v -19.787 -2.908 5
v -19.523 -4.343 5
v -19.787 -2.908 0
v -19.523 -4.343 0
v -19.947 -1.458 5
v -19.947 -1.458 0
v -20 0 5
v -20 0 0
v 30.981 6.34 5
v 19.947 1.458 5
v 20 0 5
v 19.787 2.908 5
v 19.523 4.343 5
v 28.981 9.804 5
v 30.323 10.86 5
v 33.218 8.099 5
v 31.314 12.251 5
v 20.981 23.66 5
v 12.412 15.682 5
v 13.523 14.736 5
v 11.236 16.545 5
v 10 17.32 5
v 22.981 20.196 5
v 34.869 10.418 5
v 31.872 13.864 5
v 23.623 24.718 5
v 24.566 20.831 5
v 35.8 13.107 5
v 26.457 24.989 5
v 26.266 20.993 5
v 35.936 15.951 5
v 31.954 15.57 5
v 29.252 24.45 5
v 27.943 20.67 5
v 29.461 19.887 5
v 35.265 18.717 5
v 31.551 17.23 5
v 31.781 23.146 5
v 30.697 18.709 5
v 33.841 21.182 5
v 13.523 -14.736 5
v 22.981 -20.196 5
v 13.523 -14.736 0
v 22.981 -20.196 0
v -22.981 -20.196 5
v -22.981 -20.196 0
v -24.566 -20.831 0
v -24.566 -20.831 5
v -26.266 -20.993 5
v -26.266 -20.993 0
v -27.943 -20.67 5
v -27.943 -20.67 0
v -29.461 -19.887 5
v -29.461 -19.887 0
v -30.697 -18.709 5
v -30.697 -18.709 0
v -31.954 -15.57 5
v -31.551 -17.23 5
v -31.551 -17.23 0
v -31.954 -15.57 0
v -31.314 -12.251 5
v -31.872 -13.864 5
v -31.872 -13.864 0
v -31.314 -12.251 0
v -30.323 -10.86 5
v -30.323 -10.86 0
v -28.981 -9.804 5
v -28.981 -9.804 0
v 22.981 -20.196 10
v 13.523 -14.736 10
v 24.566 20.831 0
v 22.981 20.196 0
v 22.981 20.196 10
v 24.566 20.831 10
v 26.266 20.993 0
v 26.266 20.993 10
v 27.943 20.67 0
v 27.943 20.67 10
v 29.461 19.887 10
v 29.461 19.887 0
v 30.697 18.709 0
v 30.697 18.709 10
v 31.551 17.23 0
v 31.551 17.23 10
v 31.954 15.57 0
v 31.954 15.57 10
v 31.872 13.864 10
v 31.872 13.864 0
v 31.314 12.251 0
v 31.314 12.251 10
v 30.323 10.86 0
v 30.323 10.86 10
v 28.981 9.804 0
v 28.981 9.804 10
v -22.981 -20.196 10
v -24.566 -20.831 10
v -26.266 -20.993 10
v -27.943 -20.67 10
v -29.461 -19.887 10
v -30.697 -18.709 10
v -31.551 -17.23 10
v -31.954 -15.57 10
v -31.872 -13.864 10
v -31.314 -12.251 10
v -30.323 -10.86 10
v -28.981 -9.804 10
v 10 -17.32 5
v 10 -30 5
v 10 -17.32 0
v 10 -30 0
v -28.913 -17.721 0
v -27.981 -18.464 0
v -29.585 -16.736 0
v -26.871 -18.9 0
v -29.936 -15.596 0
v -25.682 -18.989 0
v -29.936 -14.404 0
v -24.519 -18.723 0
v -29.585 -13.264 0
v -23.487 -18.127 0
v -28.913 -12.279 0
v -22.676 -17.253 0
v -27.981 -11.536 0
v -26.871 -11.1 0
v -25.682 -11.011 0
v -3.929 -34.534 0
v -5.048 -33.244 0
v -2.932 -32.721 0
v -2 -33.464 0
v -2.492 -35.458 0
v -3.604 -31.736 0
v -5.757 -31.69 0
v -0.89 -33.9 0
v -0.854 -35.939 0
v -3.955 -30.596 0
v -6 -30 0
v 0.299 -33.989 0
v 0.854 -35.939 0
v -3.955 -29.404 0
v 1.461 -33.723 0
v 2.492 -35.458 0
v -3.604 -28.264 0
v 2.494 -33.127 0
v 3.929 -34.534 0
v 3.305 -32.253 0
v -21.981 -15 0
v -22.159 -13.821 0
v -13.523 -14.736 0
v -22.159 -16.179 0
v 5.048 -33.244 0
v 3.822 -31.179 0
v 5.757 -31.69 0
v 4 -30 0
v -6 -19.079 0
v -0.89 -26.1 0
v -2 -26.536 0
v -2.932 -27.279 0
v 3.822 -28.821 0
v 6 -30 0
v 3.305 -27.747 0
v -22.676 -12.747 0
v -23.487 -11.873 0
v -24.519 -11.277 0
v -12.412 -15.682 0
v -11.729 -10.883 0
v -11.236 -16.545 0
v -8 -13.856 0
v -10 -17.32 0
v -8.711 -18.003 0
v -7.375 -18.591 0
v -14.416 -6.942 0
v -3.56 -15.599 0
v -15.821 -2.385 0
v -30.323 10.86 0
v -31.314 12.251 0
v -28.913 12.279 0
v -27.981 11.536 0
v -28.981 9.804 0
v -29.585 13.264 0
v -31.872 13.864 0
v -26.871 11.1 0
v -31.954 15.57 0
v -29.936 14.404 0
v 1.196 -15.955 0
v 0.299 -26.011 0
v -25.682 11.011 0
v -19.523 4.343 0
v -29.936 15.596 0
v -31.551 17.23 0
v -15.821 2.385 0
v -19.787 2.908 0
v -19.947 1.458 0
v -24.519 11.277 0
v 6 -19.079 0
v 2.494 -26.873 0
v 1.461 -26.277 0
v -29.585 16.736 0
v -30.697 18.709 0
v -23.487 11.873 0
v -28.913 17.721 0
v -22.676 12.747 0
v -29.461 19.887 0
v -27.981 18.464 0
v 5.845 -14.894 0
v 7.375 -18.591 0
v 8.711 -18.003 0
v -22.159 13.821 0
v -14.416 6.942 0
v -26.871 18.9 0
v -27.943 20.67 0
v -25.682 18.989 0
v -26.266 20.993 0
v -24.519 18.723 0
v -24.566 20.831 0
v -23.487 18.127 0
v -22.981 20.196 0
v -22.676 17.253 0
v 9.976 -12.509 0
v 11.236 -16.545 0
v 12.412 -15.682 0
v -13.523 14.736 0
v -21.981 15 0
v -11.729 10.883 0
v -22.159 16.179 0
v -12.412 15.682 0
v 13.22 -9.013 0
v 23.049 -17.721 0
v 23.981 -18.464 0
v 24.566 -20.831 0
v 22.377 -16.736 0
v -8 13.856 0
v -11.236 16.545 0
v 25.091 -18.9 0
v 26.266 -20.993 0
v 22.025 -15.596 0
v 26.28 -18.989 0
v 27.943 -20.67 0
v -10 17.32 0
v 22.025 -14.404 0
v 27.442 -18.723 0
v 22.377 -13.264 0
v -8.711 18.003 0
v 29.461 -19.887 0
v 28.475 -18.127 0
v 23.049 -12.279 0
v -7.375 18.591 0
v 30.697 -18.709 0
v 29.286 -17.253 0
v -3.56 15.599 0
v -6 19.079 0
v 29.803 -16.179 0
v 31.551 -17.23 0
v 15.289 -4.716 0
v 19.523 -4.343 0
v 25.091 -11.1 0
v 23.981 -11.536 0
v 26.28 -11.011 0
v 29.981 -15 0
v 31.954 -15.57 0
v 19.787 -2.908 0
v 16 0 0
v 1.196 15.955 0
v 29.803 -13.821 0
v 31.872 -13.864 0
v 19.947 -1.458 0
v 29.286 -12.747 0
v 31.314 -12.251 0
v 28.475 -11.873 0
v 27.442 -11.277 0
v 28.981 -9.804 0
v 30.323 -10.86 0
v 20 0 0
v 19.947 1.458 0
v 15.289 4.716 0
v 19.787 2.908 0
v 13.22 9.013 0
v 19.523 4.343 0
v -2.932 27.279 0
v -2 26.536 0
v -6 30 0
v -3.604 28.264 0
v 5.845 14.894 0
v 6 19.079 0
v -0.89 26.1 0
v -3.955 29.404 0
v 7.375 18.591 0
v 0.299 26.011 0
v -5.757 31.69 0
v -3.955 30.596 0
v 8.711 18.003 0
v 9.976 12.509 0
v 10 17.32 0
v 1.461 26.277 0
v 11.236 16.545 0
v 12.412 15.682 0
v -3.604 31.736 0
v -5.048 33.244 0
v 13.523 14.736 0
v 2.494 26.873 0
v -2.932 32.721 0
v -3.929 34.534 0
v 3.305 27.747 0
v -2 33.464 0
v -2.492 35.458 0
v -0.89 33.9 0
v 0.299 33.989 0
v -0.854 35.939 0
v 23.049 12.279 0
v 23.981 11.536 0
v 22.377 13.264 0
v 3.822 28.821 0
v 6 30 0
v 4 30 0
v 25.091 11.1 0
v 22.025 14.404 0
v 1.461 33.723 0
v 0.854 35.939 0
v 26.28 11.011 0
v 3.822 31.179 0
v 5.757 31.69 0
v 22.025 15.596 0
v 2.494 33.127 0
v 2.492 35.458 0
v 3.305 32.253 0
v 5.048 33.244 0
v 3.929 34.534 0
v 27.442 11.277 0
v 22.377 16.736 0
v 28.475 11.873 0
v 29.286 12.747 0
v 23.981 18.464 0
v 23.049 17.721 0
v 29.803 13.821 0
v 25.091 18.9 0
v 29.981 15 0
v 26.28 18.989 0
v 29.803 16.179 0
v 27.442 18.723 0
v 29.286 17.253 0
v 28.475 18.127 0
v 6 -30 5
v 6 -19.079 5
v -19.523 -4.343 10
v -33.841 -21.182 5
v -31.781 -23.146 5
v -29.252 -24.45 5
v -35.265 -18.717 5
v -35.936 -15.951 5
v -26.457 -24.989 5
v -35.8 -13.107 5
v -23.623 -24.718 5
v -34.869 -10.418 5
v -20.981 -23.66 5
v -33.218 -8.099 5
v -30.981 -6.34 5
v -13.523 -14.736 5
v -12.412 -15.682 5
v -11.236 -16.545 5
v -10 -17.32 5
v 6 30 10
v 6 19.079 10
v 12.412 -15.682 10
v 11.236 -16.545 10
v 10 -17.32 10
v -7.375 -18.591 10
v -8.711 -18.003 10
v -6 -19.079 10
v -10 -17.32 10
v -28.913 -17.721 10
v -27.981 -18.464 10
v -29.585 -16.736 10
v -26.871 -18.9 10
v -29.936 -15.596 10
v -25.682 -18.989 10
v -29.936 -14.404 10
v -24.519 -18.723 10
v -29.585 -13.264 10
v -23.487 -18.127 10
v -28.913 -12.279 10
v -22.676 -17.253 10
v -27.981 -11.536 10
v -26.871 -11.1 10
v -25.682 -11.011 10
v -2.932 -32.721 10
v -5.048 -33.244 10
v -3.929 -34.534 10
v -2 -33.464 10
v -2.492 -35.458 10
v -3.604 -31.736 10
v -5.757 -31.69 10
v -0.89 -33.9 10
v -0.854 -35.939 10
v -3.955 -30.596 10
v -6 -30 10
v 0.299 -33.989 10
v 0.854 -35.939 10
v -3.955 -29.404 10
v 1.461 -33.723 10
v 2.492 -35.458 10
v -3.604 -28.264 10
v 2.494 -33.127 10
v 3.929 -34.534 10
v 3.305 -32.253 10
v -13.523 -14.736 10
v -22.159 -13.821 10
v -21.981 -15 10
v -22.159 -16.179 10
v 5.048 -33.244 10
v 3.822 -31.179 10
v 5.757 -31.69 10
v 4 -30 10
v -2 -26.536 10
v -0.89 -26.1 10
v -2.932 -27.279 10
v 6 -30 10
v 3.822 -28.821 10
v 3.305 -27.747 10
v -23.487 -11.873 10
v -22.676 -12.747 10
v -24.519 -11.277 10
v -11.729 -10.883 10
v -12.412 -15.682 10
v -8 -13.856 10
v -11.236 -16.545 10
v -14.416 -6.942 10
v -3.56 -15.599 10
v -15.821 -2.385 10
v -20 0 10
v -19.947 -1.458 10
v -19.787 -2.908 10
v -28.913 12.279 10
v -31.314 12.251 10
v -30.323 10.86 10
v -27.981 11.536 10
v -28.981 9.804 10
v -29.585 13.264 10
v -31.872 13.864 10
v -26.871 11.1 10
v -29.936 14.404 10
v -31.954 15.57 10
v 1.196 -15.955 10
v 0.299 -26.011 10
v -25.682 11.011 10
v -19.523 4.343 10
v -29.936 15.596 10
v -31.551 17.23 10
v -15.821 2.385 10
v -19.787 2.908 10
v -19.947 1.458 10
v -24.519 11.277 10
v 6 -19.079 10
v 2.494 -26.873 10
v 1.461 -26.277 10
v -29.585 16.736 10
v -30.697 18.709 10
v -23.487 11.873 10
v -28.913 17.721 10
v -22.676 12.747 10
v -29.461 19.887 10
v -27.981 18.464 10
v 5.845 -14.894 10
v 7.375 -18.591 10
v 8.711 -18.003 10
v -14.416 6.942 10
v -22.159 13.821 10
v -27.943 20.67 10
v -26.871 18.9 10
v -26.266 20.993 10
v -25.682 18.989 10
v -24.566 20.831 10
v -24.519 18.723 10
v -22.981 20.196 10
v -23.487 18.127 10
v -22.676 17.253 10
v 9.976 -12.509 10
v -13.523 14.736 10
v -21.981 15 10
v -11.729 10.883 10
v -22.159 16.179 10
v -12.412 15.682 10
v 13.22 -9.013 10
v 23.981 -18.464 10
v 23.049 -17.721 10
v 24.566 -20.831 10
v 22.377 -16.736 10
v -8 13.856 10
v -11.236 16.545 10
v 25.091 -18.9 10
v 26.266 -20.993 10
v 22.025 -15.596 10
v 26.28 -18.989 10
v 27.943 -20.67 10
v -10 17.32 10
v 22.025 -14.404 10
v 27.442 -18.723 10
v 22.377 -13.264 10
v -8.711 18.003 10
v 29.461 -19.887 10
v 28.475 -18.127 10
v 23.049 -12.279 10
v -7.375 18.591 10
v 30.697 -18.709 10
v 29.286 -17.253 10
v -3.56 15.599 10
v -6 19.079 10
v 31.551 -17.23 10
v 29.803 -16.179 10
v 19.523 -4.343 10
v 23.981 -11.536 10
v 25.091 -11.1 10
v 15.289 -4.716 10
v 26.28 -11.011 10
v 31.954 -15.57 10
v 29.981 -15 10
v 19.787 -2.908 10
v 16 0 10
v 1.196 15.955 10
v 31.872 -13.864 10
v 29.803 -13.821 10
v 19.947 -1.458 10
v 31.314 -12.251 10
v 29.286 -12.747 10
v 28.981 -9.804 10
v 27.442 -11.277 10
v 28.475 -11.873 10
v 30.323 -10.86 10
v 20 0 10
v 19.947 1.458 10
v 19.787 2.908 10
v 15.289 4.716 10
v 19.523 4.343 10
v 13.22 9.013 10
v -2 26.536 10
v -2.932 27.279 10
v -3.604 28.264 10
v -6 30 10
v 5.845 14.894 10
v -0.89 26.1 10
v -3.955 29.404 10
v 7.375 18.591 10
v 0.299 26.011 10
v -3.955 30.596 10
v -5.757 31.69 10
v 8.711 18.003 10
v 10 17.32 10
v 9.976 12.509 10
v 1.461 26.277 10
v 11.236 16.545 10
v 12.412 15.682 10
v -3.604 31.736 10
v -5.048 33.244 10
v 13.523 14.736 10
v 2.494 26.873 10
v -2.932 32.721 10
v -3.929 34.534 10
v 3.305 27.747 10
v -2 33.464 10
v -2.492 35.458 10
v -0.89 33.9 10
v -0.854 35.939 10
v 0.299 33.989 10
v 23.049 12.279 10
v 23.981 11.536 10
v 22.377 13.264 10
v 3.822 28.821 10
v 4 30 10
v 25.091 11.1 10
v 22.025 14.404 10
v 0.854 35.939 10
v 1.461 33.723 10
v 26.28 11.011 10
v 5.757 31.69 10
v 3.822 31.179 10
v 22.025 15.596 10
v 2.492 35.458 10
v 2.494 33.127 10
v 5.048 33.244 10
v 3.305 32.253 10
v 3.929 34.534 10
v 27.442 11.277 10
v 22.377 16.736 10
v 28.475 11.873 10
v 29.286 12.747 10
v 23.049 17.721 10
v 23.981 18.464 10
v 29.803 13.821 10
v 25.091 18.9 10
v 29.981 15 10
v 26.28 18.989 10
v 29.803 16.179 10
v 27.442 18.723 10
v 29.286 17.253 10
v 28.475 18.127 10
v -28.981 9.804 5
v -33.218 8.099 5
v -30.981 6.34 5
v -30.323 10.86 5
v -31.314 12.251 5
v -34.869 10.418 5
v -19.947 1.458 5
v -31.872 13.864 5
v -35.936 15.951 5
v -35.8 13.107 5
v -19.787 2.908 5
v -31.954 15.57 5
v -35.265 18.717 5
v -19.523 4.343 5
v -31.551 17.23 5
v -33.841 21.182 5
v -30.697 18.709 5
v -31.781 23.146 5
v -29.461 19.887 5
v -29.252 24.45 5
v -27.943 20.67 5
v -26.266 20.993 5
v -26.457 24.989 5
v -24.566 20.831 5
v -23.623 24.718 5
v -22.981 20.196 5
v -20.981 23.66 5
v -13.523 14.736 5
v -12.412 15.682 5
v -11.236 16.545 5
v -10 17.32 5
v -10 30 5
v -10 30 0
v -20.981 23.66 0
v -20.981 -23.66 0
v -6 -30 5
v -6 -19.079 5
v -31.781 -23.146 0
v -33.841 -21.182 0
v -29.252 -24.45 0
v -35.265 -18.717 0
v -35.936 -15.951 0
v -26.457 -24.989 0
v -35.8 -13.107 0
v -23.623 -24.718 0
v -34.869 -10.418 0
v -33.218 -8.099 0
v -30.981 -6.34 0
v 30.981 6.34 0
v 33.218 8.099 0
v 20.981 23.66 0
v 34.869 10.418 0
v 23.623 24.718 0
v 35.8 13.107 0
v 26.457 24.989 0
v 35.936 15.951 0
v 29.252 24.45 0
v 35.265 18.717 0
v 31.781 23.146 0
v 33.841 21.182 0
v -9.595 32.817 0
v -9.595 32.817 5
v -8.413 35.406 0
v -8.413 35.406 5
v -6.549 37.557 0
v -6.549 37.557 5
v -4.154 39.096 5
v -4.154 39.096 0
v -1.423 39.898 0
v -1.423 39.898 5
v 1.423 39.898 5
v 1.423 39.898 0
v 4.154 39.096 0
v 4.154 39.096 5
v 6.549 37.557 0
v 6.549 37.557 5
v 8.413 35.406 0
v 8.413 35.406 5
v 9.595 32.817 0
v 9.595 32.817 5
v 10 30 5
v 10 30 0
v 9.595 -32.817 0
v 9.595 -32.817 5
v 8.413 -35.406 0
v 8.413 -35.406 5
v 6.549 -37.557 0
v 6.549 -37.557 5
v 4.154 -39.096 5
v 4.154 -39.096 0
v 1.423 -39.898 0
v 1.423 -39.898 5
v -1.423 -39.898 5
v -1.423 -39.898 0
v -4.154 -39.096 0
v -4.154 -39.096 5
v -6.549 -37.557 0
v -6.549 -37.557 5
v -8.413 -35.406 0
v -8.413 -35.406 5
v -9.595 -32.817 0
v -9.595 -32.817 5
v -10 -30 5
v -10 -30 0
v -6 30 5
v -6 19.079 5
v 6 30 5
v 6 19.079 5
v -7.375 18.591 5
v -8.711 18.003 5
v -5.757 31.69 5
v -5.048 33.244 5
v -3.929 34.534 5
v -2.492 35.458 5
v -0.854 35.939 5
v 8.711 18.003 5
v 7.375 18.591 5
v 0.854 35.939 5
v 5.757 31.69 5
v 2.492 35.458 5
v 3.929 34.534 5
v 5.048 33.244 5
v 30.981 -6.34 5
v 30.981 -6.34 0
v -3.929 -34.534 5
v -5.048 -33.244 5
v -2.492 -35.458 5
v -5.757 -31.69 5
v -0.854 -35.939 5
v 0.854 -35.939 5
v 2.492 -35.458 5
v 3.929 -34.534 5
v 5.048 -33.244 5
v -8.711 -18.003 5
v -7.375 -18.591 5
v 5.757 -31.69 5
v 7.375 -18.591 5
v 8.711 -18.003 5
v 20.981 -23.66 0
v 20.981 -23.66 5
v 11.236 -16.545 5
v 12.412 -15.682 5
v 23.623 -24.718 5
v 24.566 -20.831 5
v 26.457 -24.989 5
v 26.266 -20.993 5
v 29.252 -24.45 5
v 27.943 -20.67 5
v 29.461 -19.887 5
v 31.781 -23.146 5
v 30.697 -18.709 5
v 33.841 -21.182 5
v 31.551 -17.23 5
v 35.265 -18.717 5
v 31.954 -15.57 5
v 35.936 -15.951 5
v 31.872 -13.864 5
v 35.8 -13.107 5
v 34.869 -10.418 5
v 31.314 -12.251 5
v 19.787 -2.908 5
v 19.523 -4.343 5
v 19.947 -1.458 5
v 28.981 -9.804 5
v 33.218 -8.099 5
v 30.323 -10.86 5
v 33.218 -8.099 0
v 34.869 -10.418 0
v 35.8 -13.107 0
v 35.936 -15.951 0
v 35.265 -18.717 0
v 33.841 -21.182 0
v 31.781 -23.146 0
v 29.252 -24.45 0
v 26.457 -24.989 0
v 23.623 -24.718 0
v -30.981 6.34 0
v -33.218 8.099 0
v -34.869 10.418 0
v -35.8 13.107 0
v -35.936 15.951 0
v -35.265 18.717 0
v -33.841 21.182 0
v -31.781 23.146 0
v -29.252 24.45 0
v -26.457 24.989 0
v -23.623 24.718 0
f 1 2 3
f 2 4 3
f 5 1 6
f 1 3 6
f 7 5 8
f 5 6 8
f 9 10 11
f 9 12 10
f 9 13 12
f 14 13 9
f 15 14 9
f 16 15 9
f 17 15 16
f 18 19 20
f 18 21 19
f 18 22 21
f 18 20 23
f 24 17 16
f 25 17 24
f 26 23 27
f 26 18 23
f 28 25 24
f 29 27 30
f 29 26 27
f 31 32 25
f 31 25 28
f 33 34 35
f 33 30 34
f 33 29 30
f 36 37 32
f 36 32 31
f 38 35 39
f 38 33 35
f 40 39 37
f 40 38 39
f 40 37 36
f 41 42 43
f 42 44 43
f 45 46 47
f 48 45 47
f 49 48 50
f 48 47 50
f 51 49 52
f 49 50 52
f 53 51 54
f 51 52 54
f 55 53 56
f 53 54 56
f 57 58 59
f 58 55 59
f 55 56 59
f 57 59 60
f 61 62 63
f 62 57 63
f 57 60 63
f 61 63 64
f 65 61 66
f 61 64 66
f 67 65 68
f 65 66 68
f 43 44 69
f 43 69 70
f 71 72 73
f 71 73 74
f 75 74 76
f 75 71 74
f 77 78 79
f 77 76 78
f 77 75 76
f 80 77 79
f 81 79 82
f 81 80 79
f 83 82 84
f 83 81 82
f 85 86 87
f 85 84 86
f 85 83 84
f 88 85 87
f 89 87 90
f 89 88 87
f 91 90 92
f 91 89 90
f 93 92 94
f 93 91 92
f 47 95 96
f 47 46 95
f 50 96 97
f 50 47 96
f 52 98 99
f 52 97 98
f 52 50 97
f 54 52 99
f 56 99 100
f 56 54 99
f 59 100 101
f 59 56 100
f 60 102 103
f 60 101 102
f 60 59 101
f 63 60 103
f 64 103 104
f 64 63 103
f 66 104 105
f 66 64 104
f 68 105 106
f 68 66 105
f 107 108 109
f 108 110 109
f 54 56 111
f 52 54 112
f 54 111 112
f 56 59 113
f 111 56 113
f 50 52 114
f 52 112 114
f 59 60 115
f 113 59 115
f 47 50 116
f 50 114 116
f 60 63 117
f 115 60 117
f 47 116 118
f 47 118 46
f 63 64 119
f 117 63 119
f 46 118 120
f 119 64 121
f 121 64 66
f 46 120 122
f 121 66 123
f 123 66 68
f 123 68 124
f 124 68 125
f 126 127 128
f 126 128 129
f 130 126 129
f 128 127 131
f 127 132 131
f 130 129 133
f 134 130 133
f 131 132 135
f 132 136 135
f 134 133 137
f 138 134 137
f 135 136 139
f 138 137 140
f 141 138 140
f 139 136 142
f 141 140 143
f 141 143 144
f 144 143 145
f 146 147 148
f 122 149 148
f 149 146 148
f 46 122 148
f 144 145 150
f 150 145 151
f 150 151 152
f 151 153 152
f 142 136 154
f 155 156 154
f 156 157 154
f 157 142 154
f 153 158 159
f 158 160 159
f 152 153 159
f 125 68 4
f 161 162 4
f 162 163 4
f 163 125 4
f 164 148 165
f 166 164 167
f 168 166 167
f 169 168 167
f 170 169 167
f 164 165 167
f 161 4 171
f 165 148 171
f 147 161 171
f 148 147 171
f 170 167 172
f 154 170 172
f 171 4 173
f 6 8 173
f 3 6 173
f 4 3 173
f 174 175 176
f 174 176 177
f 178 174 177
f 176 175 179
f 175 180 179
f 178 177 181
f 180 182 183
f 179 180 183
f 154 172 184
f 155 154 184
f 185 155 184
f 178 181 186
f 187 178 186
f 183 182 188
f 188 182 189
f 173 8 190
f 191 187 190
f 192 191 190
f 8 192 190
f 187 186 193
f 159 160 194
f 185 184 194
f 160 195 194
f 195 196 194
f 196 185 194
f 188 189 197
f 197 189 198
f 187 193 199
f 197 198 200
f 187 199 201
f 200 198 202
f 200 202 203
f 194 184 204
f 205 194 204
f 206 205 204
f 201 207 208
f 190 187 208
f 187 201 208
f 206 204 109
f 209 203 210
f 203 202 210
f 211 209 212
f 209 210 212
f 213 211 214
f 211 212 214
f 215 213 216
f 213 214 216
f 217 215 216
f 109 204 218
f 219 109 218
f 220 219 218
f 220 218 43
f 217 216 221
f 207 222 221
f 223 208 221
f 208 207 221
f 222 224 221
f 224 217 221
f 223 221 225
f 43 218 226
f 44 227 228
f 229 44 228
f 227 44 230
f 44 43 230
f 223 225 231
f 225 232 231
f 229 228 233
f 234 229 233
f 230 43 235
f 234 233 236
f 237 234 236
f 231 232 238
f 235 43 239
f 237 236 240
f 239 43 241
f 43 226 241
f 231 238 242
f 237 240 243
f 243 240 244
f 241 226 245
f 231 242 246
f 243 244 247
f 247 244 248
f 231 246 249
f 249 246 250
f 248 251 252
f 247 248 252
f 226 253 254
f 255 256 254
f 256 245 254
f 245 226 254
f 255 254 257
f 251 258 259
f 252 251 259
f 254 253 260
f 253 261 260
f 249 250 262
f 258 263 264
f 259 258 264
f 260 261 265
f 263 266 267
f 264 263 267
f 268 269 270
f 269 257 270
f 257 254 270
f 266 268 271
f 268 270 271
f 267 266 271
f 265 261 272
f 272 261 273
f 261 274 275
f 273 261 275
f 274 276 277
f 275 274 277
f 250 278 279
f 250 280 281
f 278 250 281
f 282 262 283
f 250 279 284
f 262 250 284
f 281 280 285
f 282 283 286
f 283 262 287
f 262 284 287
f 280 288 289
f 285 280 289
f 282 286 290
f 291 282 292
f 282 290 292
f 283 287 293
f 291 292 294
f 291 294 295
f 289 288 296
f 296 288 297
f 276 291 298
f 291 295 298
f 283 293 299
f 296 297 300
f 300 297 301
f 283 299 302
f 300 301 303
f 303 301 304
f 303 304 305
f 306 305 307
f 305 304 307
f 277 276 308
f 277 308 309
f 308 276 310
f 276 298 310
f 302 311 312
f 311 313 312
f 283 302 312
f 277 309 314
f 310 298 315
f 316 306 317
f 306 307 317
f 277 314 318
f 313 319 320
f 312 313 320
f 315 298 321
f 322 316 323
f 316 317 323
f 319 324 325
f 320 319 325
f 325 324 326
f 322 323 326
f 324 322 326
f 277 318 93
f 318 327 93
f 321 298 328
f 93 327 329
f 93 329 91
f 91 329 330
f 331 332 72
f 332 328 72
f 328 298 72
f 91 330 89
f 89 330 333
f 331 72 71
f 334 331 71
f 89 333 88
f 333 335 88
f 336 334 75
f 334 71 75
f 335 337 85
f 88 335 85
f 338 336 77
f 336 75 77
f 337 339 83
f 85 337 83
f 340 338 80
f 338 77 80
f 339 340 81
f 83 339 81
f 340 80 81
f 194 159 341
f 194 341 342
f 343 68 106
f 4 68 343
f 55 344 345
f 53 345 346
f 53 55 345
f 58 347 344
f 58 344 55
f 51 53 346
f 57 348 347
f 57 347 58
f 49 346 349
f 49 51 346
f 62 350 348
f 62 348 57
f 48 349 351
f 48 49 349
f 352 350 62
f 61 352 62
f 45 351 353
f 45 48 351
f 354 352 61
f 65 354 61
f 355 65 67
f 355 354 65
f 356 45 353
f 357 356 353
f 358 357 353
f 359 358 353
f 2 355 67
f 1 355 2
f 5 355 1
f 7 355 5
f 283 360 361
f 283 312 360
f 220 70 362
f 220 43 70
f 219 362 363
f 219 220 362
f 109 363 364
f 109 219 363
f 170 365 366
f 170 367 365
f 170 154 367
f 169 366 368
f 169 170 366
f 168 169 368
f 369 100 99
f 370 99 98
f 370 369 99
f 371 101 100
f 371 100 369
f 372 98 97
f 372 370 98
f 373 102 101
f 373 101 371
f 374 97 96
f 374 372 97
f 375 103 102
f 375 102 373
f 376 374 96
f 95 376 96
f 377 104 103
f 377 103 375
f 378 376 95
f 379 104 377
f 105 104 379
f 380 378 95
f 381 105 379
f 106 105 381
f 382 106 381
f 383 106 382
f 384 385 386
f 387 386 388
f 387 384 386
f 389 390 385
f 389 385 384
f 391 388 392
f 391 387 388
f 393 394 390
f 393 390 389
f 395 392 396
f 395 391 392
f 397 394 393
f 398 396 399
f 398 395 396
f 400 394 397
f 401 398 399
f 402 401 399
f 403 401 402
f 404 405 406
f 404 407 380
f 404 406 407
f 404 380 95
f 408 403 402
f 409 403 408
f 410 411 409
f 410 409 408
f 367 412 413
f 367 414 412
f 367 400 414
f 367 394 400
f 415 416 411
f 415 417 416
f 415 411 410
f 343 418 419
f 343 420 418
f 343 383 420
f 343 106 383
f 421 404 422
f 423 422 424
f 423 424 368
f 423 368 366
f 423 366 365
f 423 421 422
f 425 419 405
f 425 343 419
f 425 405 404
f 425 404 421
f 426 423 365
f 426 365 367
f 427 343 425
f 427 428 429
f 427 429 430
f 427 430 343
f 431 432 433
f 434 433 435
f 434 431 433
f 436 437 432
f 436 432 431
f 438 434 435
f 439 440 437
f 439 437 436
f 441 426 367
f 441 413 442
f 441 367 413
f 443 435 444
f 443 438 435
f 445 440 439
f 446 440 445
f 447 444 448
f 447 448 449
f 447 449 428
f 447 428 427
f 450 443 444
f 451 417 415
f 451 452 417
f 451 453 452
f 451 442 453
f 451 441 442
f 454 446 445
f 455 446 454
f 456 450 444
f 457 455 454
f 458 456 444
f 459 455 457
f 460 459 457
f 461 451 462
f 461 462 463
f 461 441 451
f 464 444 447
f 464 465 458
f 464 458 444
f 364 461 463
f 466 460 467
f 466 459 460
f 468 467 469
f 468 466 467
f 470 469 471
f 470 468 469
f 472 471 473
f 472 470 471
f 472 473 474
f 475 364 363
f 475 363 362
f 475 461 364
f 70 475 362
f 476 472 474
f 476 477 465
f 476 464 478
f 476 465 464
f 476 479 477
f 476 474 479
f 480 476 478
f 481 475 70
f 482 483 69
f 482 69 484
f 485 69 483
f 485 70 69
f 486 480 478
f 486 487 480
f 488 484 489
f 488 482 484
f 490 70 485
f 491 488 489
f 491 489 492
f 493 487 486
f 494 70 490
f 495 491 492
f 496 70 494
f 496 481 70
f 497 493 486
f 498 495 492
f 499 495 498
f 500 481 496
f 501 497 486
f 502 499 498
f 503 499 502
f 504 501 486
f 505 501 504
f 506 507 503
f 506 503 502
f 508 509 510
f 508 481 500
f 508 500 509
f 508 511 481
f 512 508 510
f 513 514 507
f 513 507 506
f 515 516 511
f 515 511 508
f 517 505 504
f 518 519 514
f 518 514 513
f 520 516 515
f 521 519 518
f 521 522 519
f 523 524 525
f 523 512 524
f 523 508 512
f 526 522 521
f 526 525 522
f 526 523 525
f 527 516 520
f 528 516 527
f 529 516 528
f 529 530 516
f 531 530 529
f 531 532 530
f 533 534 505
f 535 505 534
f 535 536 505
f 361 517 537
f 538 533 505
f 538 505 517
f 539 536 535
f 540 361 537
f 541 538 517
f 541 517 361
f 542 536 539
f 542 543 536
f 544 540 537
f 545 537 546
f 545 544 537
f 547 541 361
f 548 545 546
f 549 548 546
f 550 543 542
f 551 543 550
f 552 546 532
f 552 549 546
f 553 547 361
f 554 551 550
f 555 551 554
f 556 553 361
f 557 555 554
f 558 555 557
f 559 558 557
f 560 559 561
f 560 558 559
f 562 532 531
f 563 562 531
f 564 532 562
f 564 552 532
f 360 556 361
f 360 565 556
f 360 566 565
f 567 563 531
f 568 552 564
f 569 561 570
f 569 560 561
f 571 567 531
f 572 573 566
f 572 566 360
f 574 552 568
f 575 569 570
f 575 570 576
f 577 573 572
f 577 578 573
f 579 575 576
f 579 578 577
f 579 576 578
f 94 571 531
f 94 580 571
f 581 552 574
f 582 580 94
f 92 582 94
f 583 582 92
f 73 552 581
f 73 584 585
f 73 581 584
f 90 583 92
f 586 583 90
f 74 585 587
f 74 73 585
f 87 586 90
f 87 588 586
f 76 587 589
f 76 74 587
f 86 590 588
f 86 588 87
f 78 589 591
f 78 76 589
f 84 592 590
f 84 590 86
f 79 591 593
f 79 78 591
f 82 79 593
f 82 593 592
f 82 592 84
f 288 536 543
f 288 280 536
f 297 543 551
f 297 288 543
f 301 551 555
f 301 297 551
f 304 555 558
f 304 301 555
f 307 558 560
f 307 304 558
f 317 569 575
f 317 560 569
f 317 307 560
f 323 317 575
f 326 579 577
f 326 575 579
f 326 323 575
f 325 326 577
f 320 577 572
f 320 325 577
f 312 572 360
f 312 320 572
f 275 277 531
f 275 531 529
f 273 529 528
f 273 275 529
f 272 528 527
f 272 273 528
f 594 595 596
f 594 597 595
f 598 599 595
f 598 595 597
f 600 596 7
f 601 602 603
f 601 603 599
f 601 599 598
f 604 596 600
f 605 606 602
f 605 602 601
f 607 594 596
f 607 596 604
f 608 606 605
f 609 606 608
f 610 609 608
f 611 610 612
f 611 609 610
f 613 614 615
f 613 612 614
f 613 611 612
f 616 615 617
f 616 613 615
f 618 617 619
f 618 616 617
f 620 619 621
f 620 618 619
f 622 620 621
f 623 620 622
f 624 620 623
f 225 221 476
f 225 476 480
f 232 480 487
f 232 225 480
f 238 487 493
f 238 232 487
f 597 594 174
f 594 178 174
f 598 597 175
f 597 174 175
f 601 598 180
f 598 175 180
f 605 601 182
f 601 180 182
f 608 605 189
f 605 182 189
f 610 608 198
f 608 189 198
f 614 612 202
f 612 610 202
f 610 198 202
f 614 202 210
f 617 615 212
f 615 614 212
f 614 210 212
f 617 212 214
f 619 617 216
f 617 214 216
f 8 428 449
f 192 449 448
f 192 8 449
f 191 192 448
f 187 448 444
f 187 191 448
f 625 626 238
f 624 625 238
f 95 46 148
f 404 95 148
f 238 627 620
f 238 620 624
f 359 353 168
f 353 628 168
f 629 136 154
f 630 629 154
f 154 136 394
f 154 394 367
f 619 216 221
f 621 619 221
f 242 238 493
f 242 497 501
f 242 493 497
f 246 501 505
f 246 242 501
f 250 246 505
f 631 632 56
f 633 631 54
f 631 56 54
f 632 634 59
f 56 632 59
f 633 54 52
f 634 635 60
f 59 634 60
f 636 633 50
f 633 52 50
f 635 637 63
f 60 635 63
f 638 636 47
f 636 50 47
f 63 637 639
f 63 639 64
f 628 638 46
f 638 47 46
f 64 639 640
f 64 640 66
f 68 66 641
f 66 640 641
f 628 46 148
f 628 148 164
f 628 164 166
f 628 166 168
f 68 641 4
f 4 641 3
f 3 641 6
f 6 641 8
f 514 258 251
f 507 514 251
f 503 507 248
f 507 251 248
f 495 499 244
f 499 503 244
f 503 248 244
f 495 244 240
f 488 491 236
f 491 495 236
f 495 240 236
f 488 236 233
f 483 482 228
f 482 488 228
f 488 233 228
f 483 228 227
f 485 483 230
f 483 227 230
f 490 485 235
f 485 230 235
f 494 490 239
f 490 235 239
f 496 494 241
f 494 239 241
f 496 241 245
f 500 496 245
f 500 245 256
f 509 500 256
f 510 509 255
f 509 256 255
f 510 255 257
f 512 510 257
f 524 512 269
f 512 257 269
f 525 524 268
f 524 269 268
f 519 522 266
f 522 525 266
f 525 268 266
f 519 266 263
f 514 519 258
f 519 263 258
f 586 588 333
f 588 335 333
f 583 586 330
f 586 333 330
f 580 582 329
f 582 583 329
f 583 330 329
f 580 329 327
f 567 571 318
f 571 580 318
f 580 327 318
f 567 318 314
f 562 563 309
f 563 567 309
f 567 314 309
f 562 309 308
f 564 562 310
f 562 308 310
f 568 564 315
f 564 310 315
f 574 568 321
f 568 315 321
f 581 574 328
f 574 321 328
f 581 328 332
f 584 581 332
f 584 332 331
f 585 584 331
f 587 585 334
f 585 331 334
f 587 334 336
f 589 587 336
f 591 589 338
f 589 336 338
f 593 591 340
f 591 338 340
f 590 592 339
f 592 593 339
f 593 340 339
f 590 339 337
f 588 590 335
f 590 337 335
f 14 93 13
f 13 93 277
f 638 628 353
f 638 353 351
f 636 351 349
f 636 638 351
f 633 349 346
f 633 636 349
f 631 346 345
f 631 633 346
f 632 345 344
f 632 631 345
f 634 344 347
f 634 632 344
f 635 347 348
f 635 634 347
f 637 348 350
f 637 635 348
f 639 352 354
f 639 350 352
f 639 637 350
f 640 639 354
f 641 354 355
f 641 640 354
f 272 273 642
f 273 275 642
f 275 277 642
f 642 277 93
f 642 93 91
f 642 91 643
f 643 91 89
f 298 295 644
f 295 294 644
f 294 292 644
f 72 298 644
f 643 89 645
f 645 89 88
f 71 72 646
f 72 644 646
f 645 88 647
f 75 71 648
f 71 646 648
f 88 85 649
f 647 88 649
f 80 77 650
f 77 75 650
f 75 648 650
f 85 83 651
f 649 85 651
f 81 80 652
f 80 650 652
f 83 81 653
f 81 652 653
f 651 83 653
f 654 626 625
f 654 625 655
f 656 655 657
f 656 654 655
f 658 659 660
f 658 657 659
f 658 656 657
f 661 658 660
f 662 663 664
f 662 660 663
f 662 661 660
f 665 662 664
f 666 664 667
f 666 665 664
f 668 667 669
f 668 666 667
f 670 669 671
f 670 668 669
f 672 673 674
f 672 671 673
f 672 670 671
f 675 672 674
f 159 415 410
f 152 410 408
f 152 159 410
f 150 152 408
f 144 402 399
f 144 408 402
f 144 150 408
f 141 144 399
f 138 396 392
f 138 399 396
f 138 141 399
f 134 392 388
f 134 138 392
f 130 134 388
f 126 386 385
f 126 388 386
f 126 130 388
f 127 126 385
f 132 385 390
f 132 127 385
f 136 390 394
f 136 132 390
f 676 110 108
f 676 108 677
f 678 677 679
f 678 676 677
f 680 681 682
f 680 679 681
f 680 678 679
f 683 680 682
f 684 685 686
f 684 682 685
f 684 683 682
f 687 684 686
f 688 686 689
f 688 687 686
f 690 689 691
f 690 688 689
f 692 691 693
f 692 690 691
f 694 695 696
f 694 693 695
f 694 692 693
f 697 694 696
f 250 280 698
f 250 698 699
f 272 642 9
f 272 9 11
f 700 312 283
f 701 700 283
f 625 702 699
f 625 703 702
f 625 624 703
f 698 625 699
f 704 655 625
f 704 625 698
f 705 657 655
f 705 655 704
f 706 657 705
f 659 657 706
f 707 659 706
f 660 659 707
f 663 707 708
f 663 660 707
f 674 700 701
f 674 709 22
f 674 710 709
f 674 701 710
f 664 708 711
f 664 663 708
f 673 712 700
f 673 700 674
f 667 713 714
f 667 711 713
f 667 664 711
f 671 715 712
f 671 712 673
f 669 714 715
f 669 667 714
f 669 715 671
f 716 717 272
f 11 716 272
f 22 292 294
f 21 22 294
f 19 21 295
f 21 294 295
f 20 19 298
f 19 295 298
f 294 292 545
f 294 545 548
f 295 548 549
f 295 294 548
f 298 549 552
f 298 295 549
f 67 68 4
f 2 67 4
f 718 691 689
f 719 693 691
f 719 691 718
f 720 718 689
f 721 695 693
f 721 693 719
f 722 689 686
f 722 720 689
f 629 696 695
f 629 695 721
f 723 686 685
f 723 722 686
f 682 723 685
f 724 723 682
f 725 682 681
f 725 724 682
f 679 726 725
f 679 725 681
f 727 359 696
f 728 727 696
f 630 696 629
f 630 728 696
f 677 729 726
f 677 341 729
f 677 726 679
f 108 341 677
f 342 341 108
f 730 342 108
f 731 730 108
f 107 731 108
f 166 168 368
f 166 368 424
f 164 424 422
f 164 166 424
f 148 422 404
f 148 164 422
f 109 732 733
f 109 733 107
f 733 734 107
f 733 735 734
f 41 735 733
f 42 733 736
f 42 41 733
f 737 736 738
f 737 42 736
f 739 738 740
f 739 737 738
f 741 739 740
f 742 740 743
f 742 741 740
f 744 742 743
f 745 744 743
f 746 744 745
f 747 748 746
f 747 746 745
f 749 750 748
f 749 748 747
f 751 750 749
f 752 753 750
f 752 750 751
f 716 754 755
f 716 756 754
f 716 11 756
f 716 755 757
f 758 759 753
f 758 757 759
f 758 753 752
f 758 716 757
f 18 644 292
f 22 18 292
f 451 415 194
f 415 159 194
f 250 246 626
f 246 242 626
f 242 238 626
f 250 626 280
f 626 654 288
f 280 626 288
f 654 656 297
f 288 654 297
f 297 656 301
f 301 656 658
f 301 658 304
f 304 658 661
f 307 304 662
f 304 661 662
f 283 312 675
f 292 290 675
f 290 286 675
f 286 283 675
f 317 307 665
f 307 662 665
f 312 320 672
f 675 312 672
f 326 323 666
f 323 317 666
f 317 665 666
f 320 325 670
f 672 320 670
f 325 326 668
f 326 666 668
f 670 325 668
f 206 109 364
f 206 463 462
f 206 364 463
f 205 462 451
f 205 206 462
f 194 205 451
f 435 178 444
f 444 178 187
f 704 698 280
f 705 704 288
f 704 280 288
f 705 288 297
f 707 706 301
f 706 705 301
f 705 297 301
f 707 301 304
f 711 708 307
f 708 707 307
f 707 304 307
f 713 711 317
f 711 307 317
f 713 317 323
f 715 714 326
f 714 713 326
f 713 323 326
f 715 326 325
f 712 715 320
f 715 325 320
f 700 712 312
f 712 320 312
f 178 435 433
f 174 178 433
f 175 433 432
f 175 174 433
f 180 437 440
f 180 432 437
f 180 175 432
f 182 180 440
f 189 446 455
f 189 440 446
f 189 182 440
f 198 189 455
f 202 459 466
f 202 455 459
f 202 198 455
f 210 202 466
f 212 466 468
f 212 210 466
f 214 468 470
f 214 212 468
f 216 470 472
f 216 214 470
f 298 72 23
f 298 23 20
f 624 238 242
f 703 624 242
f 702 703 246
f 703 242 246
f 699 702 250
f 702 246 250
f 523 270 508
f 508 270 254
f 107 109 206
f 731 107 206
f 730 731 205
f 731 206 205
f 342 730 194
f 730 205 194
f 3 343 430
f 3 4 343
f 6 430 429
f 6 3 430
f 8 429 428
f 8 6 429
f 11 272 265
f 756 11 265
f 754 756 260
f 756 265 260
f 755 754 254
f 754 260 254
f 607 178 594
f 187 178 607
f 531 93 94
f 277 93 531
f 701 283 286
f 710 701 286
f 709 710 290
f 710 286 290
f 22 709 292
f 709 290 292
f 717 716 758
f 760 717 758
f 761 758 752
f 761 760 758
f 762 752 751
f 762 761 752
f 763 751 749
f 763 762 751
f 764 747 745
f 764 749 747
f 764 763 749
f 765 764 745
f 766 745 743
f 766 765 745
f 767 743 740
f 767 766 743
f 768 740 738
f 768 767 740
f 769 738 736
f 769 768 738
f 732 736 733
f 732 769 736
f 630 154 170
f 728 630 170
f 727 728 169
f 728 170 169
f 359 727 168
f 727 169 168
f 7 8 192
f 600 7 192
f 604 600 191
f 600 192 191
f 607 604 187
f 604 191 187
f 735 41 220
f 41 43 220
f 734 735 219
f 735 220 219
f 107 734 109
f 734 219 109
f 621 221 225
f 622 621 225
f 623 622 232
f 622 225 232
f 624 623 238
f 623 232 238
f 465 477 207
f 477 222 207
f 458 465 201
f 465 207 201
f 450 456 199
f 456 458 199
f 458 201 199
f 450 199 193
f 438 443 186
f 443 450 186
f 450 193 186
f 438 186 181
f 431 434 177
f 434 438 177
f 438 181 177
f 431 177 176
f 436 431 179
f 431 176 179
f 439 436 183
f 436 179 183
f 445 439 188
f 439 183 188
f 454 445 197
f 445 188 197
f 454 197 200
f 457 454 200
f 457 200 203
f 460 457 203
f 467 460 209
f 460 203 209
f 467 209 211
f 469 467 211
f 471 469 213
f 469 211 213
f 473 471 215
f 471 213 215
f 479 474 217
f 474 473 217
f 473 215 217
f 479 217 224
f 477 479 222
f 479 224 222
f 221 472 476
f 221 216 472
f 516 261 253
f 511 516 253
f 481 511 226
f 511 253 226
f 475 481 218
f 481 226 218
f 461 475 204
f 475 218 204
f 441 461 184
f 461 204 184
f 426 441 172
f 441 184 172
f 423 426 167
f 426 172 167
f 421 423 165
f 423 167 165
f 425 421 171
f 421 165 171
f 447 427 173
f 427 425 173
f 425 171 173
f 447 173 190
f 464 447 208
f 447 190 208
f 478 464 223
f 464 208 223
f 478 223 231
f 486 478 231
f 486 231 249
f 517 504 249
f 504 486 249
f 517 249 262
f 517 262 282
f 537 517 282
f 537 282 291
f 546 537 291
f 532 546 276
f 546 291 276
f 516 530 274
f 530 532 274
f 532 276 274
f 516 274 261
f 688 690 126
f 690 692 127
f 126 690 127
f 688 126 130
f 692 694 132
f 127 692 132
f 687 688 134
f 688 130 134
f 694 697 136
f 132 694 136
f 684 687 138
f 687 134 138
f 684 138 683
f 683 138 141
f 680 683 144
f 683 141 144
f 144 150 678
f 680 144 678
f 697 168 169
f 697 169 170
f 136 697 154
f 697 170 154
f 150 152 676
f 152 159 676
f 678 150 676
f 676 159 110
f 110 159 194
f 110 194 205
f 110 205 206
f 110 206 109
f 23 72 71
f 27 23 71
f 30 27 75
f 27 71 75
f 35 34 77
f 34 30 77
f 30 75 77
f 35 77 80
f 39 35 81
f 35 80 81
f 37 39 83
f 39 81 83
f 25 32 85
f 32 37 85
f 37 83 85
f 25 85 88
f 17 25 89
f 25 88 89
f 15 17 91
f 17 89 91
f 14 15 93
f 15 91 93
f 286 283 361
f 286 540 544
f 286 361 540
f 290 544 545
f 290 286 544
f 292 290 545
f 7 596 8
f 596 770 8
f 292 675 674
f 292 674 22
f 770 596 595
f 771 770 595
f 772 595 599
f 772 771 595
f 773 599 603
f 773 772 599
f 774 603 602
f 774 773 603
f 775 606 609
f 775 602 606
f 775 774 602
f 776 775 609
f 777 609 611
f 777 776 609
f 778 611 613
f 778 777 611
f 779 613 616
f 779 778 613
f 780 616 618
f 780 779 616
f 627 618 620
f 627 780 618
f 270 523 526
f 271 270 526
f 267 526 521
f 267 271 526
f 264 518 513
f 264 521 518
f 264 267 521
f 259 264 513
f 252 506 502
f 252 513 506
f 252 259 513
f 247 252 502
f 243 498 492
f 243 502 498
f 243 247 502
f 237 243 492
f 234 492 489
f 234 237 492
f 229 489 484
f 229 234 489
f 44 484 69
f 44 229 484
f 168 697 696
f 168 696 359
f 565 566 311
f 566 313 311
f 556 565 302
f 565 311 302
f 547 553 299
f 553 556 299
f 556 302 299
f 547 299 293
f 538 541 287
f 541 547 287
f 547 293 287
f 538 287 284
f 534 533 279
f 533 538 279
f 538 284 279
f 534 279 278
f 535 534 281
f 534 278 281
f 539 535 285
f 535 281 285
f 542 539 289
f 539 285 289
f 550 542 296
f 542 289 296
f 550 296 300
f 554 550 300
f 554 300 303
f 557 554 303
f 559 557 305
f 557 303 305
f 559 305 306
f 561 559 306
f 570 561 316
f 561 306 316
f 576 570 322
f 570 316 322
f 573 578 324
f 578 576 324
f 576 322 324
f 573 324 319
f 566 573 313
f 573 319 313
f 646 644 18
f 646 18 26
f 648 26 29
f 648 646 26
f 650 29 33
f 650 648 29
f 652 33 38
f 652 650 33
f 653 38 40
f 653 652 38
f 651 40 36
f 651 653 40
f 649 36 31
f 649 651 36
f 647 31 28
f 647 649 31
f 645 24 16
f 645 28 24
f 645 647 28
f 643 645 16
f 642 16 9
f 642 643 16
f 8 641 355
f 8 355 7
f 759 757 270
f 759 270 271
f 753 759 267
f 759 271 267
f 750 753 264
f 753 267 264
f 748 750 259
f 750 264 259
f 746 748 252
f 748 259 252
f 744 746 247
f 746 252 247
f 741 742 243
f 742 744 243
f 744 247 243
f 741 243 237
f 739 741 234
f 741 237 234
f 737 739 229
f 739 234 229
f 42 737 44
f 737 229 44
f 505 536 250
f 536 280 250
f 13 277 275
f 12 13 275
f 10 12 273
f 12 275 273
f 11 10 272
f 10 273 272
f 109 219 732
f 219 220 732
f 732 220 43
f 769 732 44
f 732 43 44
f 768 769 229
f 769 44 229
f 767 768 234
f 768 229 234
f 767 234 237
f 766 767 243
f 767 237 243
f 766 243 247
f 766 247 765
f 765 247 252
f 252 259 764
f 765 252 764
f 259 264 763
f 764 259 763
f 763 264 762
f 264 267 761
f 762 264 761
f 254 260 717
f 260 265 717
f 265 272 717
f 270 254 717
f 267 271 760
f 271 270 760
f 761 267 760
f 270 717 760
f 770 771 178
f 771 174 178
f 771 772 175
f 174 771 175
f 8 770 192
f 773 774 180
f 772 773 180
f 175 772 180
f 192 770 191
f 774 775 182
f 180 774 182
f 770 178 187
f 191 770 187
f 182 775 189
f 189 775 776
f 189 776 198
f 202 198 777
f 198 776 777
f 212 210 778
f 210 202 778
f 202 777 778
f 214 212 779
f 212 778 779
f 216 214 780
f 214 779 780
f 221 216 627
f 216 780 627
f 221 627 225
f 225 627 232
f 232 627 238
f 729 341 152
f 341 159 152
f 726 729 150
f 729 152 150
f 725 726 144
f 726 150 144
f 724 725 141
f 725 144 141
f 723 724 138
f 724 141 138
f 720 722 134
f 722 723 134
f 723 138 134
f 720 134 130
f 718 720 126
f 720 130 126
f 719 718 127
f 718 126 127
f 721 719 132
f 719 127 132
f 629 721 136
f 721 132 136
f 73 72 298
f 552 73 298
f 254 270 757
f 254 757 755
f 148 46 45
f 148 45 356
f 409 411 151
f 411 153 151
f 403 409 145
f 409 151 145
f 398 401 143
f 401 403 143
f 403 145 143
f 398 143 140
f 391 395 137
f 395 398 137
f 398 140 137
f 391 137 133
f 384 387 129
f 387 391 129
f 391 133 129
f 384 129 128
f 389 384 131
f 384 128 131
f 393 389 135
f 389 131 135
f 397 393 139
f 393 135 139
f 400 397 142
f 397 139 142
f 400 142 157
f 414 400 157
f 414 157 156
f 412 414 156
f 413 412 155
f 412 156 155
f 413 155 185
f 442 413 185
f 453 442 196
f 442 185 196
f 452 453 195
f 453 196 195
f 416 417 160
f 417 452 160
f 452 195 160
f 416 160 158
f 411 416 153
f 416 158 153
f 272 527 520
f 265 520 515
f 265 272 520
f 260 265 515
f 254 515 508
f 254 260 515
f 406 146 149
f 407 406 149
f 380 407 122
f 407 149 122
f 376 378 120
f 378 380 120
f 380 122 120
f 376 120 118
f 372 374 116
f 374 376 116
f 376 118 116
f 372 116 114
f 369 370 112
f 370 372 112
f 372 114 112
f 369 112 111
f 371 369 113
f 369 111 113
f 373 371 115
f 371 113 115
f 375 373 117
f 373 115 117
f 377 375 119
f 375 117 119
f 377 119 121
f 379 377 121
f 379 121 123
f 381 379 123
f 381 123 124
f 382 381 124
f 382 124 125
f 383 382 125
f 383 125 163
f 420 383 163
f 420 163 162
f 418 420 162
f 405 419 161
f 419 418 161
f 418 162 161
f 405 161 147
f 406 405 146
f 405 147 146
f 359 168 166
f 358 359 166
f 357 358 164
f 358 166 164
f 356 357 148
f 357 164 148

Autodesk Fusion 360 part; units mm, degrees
sketch "Sketch1" plane through (0, 0, 0) normal (0, 0, 1) x (1, 0, 0)
  circle A0 centre (0, 0) radius 16
  circle A1 centre (0, 0) radius 30 construction
  line L0 (0, 0) -> (0, 30) construction
  line L1 (0, 0) -> (30, 0) construction
  line L2 (0, 0) -> (-30, 0) construction
  line L3 (0, 0) -> (0, -30) construction
  circle A2 centre (0, 30) radius 4
  line L4 (0, 30) -> (10, 30) construction
  line L5 (10, 30) -> (10, 17.3205)
  line L6 (0, 30) -> (-10, 30) construction
  line L7 (-10, 30) -> (-10, 17.3205)
  line L8 (-6, 30) -> (-6, 19.0788)
  line L9 (6, 30) -> (6, 19.0788)
  arc A3 (5.9699, 29.4) -> (-5.9699, 29.4) centre (0, 30) ccw
  arc A4 (9.8601, 28.3333) -> (-9.8601, 28.3333) centre (0, 30) ccw
  line L10 (-30.9808, 6.3397) -> (-20, 0)
  arc A5 (-19.6073, 22.7058) -> (-29.4675, 5.6275) centre (-25.9808, 15) ccw
  line L11 (-20.9808, 23.6603) -> (-10, 17.3205)
  line L12 (-22.9808, 20.1962) -> (-13.5227, 14.7355)
  line L13 (-28.9808, 9.8038) -> (-19.5227, 4.3432)
  arc A6 (-22.4762, 19.8701) -> (-28.4461, 9.5299) centre (-25.9808, 15) ccw
  circle A7 centre (-25.9808, 15) radius 4
  line L14 (-20.9808, -23.6603) -> (-10, -17.3205)
  arc A8 (-29.4675, -5.6275) -> (-19.6073, -22.7058) centre (-25.9808, -15) ccw
  line L15 (-30.9808, -6.3397) -> (-20, 0)
  line L16 (-28.9808, -9.8038) -> (-19.5227, -4.3432)
  line L17 (-22.9808, -20.1962) -> (-13.5227, -14.7355)
  arc A9 (-28.4461, -9.5299) -> (-22.4762, -19.8701) centre (-25.9808, -15) ccw
  circle A10 centre (-25.9808, -15) radius 4
  line L18 (10, -30) -> (10, -17.3205)
  arc A11 (-9.8601, -28.3333) -> (9.8601, -28.3333) centre (0, -30) ccw
  line L19 (-10, -30) -> (-10, -17.3205)
  line L20 (-6, -30) -> (-6, -19.0788)
  line L21 (6, -30) -> (6, -19.0788)
  arc A12 (-5.9699, -29.4) -> (5.9699, -29.4) centre (0, -30) ccw
  circle A13 centre (0, -30) radius 4
  line L22 (30.9808, -6.3397) -> (20, 0)
  arc A14 (19.6073, -22.7058) -> (29.4675, -5.6275) centre (25.9808, -15) ccw
  line L23 (20.9808, -23.6603) -> (10, -17.3205)
  line L24 (22.9808, -20.1962) -> (13.5227, -14.7355)
  line L25 (28.9808, -9.8038) -> (19.5227, -4.3432)
  arc A15 (22.4762, -19.8701) -> (28.4461, -9.5299) centre (25.9808, -15) ccw
  circle A16 centre (25.9808, -15) radius 4
  line L26 (20.9808, 23.6603) -> (10, 17.3205)
  arc A17 (29.4675, 5.6275) -> (19.6073, 22.7058) centre (25.9808, 15) ccw
  line L27 (30.9808, 6.3397) -> (20, 0)
  line L28 (28.9808, 9.8038) -> (19.5227, 4.3432)
  line L29 (22.9808, 20.1962) -> (13.5227, 14.7355)
  arc A18 (28.4461, 9.5299) -> (22.4762, 19.8701) centre (25.9808, 15) ccw
  circle A19 centre (25.9808, 15) radius 4
  arc A20 (-6, 19.0788) -> (-13.5227, 14.7355) centre (0, 0) ccw
  arc A21 (13.5227, 14.7355) -> (6, 19.0788) centre (0, 0) ccw
  arc A22 (19.5227, -4.3432) -> (19.5227, 4.3432) centre (0, 0) ccw
  arc A23 (6, -19.0788) -> (13.5227, -14.7355) centre (0, 0) ccw
  arc A24 (-19.5227, 4.3432) -> (-19.5227, -4.3432) centre (0, 0) ccw
  arc A25 (-13.5227, -14.7355) -> (-6, -19.0788) centre (0, 0) ccw
  dimension "d1" = 32
  dimension "d2" = 40
  dimension "d3" = 60
  dimension "d4" = 8
  dimension "d5" = 12
  dimension "d6" = 20
  dimension "d8" = 360
extrude "Extrude1" add sketch "Sketch1" along normal blind 10 contours L8 L9 A3 L12 L13 A6 L16 L17 A9 L20 L21 A12 L24 L25 A15 L28 L29 A18 A20 A21 A22 A23 A24 A25 makes body 1
extrude "Extrude2" add sketch "Sketch1" along normal blind 5 separate body contours L5 L7 L8 L9 A3 A4 A20 A21 | L26 A17 L27 L28 L29 A18 A21 A22 | L10 A5 L11 L12 L13 A6 A20 A24 | L22 A14 L23 L24 L25 A15 A22 A23 | L14 A8 L15 L16 L17 A9 A24 A25 | L18 A11 L19 L20 L21 A12 A23 A25 makes body 2 at (-26.4947, 6.8289, 0)
